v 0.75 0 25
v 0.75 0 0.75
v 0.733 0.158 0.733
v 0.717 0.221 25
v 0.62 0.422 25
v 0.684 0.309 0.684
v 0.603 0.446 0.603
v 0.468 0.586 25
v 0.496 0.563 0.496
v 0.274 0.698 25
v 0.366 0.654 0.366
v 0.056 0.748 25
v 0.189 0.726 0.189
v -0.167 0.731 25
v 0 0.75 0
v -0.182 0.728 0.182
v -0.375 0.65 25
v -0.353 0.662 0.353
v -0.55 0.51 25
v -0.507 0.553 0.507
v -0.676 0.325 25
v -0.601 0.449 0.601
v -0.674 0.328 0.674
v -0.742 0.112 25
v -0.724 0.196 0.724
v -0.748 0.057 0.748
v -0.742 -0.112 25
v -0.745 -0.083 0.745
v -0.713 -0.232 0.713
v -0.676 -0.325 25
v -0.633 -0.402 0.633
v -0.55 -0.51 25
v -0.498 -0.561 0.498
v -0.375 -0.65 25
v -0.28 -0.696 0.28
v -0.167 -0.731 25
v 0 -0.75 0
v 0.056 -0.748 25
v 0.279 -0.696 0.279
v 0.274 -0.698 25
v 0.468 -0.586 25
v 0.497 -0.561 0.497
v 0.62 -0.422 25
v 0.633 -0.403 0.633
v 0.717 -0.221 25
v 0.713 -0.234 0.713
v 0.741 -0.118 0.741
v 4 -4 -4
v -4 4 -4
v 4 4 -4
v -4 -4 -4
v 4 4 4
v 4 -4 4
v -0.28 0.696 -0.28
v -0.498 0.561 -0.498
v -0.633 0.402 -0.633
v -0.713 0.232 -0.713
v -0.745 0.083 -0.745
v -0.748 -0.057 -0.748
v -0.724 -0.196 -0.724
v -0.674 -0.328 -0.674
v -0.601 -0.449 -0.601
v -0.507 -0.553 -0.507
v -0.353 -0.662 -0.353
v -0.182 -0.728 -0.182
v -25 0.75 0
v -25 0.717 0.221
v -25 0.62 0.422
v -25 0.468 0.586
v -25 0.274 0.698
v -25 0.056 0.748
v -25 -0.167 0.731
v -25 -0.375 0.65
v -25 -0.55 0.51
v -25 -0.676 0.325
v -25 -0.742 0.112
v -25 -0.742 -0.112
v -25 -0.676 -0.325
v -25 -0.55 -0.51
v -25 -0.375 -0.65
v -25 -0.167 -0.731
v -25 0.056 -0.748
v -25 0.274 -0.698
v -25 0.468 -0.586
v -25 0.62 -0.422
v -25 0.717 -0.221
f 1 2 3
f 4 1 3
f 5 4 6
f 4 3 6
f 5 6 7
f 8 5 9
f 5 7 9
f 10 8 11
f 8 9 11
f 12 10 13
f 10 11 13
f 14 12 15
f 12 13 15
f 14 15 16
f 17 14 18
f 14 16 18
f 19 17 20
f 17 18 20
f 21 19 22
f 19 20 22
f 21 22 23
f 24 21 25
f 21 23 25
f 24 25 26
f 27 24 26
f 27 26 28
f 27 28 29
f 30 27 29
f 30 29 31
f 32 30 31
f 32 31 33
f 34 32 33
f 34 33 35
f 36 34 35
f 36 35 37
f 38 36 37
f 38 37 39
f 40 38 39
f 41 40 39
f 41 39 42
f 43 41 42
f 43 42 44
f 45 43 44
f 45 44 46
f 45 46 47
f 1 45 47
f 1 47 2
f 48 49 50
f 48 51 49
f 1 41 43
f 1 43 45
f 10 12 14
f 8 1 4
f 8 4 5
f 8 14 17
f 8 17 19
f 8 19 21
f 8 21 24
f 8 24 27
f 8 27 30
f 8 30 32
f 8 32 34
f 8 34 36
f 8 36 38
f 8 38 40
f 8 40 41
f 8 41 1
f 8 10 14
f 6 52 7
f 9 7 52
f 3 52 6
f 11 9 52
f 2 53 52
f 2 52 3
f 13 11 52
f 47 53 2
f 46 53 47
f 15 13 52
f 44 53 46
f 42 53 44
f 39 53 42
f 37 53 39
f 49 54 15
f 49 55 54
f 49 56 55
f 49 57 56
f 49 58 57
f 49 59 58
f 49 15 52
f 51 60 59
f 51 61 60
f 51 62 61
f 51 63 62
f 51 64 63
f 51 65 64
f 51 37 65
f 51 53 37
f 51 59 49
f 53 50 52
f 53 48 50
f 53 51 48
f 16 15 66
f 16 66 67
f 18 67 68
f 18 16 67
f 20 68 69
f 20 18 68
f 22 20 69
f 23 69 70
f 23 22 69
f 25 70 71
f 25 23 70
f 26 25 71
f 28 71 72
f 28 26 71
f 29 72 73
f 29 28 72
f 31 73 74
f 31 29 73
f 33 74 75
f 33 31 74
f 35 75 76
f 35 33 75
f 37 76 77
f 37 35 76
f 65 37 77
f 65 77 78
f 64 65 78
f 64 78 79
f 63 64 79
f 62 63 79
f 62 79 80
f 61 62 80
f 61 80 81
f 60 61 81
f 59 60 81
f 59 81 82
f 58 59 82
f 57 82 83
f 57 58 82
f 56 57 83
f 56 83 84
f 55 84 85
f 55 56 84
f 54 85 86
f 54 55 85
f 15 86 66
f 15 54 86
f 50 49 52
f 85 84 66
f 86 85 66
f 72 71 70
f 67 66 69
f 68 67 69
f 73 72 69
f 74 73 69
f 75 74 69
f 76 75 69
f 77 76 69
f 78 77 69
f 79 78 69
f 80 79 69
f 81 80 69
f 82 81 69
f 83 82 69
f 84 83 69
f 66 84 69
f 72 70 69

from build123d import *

# Parameters (mm, degrees)
F1_DEPTH = 4
F2_R     = 0.75
F3_DEPTH = 25
F4_R     = 0.75
F5_DEPTH = 25


with BuildPart() as f1:
    # F0 (on Front) → F1 (new body, symmetric)
    with BuildSketch(Plane.XZ):
        Polygon((4, -4), (4, 4), (-4, -4), align=None)
    extrude(amount=F1_DEPTH, both=True)

    # F2 (on Top) → F3 (join)
    with BuildSketch(Plane.XY):
        Circle(F2_R)
    extrude(amount=F3_DEPTH)

    # F4 (on Right) → F5 (join)
    with BuildSketch(Plane.YZ):
        Circle(F4_R)
    extrude(amount=-F5_DEPTH)


solid = f1.part
